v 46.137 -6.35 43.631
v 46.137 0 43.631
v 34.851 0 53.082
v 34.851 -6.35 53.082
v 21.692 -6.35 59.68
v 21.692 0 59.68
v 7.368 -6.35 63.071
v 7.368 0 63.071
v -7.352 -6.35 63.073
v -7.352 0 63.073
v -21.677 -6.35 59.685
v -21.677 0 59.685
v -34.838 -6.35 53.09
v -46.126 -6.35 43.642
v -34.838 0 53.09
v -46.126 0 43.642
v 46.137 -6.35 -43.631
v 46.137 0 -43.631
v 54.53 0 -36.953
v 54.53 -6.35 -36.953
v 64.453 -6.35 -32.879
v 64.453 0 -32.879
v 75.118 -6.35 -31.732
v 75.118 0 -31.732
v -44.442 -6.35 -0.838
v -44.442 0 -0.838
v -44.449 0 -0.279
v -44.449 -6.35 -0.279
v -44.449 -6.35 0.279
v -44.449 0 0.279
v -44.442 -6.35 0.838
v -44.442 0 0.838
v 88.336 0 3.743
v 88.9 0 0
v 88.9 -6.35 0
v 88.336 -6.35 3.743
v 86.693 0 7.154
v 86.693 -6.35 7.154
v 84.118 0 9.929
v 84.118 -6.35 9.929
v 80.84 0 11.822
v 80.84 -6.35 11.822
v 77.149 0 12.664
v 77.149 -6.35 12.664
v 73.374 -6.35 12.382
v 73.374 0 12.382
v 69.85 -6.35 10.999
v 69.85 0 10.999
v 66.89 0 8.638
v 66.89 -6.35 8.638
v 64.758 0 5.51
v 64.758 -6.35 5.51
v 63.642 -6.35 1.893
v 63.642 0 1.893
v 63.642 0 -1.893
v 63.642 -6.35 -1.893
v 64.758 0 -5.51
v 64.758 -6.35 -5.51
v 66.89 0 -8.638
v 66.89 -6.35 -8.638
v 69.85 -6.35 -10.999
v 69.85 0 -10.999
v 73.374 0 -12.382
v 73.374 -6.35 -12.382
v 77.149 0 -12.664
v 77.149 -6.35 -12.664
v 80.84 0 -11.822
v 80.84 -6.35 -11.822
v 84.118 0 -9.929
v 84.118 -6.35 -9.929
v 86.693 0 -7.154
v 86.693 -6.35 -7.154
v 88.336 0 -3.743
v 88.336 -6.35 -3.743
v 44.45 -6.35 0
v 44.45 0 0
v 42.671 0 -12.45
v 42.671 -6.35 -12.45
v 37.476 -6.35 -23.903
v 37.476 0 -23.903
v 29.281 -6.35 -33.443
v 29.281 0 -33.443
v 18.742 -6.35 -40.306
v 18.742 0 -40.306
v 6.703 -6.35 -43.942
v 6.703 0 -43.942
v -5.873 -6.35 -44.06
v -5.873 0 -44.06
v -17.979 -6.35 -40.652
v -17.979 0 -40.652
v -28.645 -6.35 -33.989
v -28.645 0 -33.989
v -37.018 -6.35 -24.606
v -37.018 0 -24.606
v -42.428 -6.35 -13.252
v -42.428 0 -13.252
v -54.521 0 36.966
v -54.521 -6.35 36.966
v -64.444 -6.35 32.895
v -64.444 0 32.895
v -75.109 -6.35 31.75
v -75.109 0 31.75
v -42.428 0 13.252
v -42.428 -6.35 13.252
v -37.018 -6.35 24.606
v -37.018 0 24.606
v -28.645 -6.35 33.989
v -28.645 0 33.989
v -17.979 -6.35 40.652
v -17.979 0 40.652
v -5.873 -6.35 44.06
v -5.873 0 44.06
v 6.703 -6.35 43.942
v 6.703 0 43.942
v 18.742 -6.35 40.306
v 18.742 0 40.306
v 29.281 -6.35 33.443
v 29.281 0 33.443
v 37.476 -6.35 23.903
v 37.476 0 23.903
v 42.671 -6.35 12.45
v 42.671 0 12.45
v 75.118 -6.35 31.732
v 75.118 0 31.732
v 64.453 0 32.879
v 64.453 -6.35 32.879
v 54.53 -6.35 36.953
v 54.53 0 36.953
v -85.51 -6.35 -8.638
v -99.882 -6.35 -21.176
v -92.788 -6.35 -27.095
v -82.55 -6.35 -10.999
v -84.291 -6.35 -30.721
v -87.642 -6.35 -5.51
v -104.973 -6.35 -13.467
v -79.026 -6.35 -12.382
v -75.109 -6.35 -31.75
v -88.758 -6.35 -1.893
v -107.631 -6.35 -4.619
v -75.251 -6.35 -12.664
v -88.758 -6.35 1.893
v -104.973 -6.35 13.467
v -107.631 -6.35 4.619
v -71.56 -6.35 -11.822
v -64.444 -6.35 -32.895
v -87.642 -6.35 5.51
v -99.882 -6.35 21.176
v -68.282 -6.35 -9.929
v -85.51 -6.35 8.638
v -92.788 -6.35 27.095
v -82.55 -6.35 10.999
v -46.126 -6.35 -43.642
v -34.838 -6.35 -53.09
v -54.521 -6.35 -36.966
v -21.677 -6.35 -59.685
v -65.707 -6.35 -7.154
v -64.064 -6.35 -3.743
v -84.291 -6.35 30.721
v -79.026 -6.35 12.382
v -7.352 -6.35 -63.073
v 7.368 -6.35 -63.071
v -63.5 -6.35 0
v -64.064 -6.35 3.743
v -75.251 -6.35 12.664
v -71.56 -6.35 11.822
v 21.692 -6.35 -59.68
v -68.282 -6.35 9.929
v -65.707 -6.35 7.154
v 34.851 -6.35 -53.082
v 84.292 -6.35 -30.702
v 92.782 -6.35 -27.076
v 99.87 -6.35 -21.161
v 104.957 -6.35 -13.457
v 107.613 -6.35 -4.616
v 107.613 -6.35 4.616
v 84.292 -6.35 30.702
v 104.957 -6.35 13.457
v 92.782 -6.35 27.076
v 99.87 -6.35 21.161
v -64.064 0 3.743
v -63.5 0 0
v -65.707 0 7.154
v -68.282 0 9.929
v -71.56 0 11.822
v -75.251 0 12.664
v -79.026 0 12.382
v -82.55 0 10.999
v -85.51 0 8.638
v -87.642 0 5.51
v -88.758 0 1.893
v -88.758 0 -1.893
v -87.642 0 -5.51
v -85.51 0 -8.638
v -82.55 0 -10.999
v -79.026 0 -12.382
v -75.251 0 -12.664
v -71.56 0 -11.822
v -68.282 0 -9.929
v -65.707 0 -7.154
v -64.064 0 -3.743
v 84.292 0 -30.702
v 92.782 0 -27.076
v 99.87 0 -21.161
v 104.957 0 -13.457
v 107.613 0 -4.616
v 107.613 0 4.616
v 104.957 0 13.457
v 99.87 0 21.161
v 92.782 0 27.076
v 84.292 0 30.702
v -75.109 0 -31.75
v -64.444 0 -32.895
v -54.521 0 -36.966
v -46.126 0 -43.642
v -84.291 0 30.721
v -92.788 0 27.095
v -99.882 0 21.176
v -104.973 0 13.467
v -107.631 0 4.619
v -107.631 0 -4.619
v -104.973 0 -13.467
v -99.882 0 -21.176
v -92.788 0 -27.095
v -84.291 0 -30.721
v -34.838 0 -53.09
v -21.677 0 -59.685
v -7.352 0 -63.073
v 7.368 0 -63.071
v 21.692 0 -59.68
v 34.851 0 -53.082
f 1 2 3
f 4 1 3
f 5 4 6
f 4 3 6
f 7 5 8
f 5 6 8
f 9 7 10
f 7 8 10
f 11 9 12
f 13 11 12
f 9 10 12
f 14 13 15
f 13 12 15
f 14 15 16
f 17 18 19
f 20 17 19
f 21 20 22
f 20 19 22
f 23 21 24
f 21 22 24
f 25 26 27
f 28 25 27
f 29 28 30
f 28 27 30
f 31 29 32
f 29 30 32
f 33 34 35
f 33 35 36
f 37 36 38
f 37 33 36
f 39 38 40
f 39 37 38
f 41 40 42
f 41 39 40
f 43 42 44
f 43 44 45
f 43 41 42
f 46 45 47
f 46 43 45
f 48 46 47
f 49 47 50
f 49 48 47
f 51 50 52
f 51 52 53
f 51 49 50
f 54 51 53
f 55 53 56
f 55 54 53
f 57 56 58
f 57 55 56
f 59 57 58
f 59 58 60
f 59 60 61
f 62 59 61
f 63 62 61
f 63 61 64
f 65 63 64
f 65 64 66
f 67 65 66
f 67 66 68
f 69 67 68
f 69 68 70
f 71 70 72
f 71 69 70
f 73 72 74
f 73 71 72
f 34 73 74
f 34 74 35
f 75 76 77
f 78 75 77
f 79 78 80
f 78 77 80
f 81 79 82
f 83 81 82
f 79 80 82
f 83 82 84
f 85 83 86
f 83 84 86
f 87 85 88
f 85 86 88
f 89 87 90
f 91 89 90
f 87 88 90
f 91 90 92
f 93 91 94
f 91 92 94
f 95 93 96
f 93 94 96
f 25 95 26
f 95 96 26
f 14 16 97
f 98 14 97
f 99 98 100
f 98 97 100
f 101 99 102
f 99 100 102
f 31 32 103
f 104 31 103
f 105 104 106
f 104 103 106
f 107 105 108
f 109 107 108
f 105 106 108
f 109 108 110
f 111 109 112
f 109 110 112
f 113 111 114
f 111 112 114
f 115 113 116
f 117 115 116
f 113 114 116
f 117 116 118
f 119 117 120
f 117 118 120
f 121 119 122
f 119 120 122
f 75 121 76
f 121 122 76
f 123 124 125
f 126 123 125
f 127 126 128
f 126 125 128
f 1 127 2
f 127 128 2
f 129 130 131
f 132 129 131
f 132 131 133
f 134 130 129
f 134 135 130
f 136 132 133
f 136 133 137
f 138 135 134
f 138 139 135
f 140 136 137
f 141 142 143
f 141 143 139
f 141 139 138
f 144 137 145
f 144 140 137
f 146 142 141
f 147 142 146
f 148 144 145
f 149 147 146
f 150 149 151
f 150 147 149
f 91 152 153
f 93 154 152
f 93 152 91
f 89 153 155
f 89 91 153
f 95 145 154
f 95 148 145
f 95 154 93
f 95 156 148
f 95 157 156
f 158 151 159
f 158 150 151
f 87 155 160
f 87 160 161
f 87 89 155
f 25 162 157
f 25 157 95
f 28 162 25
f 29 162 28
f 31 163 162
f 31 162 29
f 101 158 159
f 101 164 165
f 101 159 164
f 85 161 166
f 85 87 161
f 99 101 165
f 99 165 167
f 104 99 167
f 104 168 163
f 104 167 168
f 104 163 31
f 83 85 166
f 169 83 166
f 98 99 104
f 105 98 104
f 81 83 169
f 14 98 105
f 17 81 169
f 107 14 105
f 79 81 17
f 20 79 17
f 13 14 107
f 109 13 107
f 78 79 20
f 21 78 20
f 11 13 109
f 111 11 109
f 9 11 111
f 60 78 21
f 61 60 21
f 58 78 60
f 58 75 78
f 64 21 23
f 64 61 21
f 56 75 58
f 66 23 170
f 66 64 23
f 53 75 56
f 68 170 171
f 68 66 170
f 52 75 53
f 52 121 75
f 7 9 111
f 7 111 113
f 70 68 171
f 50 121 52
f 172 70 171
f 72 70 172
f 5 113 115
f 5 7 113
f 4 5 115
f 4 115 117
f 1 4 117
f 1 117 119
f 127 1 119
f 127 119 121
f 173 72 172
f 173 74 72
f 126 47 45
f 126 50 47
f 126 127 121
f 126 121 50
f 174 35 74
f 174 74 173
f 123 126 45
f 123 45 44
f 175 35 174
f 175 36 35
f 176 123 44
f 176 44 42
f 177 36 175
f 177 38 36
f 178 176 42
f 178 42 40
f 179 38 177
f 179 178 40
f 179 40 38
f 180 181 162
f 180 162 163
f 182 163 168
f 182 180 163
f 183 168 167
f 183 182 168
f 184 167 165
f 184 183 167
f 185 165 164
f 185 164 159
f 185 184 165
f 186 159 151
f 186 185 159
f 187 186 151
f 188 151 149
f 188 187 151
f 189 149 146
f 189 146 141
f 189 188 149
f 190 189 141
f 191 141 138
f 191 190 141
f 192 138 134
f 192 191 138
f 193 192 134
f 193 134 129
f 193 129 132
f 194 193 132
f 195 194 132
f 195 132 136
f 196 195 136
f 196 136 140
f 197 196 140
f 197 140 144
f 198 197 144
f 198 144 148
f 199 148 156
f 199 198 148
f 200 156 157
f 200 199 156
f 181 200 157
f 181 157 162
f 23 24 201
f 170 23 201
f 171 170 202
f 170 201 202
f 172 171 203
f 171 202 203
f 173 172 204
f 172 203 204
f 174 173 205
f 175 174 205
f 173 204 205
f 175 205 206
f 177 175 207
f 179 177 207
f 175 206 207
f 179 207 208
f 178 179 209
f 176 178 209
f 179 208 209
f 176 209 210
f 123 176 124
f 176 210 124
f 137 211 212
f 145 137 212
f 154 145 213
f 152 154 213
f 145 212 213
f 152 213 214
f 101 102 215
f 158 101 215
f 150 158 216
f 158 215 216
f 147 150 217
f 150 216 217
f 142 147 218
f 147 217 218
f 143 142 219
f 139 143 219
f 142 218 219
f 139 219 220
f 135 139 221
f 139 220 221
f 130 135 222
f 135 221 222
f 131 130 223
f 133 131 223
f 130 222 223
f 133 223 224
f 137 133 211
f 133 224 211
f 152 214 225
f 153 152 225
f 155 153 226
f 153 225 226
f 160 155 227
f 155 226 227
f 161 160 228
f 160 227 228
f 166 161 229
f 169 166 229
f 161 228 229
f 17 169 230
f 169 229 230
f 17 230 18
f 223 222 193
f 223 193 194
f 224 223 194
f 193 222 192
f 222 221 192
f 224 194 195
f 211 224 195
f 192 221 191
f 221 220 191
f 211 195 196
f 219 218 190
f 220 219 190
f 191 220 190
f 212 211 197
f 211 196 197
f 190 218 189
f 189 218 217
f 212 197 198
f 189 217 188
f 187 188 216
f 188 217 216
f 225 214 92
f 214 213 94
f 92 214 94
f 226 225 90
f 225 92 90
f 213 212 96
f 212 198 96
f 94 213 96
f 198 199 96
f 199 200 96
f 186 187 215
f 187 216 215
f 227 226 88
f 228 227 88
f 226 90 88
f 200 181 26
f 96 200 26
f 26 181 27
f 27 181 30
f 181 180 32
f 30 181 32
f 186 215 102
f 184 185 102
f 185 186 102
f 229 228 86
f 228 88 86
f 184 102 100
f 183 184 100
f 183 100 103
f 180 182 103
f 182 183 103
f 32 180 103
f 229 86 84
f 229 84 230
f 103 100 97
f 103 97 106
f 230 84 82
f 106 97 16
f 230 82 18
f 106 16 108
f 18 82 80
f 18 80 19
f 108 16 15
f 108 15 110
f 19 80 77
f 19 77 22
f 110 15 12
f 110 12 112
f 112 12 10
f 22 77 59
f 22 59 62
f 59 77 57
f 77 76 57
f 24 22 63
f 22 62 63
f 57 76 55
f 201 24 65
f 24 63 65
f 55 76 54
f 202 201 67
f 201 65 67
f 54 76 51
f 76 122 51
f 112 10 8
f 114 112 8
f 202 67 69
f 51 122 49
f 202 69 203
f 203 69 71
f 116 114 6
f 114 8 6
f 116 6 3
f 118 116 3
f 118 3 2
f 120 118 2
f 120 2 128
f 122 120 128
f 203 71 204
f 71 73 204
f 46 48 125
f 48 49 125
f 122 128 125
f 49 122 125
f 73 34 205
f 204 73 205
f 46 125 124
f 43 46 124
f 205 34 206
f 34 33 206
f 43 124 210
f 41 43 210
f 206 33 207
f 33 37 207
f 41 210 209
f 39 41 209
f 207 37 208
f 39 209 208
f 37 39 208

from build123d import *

# Parameters (mm, degrees)
F0_R     = 12.7
F1_DEPTH = 6.35


with BuildPart() as f1:
    # F0 (on Front) → F1 (new body)
    with BuildSketch(Plane.XZ):
        with BuildLine():
            ThreePointArc((-75.109355, -31.75024), (-59.33875, -34.579478), (-46.125851, -43.642363))
            ThreePointArc((-46.125851, -43.642363), (0.007907, -63.5), (46.136719, -43.630874))
            ThreePointArc((46.136719, -43.630874), (59.347524, -34.564632), (75.117614, -31.731545))
            ThreePointArc((75.117614, -31.731545), (107.95, 0), (75.117614, 31.731545))
            ThreePointArc((75.117614, 31.731545), (59.347524, 34.564632), (46.136719, 43.630874))
            ThreePointArc((46.136719, 43.630874), (0.007907, 63.5), (-46.125851, 43.642363))
            ThreePointArc((-46.125851, 43.642363), (-59.33875, 34.579478), (-75.109355, 31.75024))
            ThreePointArc((-75.109355, 31.75024), (-107.968966, 0), (-75.109355, -31.75024))
        make_face()
        with Locations((-76.2, 0)):
            Circle(F0_R, mode=Mode.SUBTRACT)
        with BuildLine():
            ThreePointArc((-44.442095, 0.838267), (0.419152, 44.448024), (44.45, 0))
            ThreePointArc((44.45, 0), (0.419152, -44.448024), (-44.442095, -0.838267))
            ThreePointArc((-44.442095, -0.838267), (-44.45, 0), (-44.442095, 0.838267))
        make_face(mode=Mode.SUBTRACT)
        with Locations((76.2, 0)):
            Circle(F0_R, mode=Mode.SUBTRACT)
    extrude(amount=F1_DEPTH)


solid = f1.part
